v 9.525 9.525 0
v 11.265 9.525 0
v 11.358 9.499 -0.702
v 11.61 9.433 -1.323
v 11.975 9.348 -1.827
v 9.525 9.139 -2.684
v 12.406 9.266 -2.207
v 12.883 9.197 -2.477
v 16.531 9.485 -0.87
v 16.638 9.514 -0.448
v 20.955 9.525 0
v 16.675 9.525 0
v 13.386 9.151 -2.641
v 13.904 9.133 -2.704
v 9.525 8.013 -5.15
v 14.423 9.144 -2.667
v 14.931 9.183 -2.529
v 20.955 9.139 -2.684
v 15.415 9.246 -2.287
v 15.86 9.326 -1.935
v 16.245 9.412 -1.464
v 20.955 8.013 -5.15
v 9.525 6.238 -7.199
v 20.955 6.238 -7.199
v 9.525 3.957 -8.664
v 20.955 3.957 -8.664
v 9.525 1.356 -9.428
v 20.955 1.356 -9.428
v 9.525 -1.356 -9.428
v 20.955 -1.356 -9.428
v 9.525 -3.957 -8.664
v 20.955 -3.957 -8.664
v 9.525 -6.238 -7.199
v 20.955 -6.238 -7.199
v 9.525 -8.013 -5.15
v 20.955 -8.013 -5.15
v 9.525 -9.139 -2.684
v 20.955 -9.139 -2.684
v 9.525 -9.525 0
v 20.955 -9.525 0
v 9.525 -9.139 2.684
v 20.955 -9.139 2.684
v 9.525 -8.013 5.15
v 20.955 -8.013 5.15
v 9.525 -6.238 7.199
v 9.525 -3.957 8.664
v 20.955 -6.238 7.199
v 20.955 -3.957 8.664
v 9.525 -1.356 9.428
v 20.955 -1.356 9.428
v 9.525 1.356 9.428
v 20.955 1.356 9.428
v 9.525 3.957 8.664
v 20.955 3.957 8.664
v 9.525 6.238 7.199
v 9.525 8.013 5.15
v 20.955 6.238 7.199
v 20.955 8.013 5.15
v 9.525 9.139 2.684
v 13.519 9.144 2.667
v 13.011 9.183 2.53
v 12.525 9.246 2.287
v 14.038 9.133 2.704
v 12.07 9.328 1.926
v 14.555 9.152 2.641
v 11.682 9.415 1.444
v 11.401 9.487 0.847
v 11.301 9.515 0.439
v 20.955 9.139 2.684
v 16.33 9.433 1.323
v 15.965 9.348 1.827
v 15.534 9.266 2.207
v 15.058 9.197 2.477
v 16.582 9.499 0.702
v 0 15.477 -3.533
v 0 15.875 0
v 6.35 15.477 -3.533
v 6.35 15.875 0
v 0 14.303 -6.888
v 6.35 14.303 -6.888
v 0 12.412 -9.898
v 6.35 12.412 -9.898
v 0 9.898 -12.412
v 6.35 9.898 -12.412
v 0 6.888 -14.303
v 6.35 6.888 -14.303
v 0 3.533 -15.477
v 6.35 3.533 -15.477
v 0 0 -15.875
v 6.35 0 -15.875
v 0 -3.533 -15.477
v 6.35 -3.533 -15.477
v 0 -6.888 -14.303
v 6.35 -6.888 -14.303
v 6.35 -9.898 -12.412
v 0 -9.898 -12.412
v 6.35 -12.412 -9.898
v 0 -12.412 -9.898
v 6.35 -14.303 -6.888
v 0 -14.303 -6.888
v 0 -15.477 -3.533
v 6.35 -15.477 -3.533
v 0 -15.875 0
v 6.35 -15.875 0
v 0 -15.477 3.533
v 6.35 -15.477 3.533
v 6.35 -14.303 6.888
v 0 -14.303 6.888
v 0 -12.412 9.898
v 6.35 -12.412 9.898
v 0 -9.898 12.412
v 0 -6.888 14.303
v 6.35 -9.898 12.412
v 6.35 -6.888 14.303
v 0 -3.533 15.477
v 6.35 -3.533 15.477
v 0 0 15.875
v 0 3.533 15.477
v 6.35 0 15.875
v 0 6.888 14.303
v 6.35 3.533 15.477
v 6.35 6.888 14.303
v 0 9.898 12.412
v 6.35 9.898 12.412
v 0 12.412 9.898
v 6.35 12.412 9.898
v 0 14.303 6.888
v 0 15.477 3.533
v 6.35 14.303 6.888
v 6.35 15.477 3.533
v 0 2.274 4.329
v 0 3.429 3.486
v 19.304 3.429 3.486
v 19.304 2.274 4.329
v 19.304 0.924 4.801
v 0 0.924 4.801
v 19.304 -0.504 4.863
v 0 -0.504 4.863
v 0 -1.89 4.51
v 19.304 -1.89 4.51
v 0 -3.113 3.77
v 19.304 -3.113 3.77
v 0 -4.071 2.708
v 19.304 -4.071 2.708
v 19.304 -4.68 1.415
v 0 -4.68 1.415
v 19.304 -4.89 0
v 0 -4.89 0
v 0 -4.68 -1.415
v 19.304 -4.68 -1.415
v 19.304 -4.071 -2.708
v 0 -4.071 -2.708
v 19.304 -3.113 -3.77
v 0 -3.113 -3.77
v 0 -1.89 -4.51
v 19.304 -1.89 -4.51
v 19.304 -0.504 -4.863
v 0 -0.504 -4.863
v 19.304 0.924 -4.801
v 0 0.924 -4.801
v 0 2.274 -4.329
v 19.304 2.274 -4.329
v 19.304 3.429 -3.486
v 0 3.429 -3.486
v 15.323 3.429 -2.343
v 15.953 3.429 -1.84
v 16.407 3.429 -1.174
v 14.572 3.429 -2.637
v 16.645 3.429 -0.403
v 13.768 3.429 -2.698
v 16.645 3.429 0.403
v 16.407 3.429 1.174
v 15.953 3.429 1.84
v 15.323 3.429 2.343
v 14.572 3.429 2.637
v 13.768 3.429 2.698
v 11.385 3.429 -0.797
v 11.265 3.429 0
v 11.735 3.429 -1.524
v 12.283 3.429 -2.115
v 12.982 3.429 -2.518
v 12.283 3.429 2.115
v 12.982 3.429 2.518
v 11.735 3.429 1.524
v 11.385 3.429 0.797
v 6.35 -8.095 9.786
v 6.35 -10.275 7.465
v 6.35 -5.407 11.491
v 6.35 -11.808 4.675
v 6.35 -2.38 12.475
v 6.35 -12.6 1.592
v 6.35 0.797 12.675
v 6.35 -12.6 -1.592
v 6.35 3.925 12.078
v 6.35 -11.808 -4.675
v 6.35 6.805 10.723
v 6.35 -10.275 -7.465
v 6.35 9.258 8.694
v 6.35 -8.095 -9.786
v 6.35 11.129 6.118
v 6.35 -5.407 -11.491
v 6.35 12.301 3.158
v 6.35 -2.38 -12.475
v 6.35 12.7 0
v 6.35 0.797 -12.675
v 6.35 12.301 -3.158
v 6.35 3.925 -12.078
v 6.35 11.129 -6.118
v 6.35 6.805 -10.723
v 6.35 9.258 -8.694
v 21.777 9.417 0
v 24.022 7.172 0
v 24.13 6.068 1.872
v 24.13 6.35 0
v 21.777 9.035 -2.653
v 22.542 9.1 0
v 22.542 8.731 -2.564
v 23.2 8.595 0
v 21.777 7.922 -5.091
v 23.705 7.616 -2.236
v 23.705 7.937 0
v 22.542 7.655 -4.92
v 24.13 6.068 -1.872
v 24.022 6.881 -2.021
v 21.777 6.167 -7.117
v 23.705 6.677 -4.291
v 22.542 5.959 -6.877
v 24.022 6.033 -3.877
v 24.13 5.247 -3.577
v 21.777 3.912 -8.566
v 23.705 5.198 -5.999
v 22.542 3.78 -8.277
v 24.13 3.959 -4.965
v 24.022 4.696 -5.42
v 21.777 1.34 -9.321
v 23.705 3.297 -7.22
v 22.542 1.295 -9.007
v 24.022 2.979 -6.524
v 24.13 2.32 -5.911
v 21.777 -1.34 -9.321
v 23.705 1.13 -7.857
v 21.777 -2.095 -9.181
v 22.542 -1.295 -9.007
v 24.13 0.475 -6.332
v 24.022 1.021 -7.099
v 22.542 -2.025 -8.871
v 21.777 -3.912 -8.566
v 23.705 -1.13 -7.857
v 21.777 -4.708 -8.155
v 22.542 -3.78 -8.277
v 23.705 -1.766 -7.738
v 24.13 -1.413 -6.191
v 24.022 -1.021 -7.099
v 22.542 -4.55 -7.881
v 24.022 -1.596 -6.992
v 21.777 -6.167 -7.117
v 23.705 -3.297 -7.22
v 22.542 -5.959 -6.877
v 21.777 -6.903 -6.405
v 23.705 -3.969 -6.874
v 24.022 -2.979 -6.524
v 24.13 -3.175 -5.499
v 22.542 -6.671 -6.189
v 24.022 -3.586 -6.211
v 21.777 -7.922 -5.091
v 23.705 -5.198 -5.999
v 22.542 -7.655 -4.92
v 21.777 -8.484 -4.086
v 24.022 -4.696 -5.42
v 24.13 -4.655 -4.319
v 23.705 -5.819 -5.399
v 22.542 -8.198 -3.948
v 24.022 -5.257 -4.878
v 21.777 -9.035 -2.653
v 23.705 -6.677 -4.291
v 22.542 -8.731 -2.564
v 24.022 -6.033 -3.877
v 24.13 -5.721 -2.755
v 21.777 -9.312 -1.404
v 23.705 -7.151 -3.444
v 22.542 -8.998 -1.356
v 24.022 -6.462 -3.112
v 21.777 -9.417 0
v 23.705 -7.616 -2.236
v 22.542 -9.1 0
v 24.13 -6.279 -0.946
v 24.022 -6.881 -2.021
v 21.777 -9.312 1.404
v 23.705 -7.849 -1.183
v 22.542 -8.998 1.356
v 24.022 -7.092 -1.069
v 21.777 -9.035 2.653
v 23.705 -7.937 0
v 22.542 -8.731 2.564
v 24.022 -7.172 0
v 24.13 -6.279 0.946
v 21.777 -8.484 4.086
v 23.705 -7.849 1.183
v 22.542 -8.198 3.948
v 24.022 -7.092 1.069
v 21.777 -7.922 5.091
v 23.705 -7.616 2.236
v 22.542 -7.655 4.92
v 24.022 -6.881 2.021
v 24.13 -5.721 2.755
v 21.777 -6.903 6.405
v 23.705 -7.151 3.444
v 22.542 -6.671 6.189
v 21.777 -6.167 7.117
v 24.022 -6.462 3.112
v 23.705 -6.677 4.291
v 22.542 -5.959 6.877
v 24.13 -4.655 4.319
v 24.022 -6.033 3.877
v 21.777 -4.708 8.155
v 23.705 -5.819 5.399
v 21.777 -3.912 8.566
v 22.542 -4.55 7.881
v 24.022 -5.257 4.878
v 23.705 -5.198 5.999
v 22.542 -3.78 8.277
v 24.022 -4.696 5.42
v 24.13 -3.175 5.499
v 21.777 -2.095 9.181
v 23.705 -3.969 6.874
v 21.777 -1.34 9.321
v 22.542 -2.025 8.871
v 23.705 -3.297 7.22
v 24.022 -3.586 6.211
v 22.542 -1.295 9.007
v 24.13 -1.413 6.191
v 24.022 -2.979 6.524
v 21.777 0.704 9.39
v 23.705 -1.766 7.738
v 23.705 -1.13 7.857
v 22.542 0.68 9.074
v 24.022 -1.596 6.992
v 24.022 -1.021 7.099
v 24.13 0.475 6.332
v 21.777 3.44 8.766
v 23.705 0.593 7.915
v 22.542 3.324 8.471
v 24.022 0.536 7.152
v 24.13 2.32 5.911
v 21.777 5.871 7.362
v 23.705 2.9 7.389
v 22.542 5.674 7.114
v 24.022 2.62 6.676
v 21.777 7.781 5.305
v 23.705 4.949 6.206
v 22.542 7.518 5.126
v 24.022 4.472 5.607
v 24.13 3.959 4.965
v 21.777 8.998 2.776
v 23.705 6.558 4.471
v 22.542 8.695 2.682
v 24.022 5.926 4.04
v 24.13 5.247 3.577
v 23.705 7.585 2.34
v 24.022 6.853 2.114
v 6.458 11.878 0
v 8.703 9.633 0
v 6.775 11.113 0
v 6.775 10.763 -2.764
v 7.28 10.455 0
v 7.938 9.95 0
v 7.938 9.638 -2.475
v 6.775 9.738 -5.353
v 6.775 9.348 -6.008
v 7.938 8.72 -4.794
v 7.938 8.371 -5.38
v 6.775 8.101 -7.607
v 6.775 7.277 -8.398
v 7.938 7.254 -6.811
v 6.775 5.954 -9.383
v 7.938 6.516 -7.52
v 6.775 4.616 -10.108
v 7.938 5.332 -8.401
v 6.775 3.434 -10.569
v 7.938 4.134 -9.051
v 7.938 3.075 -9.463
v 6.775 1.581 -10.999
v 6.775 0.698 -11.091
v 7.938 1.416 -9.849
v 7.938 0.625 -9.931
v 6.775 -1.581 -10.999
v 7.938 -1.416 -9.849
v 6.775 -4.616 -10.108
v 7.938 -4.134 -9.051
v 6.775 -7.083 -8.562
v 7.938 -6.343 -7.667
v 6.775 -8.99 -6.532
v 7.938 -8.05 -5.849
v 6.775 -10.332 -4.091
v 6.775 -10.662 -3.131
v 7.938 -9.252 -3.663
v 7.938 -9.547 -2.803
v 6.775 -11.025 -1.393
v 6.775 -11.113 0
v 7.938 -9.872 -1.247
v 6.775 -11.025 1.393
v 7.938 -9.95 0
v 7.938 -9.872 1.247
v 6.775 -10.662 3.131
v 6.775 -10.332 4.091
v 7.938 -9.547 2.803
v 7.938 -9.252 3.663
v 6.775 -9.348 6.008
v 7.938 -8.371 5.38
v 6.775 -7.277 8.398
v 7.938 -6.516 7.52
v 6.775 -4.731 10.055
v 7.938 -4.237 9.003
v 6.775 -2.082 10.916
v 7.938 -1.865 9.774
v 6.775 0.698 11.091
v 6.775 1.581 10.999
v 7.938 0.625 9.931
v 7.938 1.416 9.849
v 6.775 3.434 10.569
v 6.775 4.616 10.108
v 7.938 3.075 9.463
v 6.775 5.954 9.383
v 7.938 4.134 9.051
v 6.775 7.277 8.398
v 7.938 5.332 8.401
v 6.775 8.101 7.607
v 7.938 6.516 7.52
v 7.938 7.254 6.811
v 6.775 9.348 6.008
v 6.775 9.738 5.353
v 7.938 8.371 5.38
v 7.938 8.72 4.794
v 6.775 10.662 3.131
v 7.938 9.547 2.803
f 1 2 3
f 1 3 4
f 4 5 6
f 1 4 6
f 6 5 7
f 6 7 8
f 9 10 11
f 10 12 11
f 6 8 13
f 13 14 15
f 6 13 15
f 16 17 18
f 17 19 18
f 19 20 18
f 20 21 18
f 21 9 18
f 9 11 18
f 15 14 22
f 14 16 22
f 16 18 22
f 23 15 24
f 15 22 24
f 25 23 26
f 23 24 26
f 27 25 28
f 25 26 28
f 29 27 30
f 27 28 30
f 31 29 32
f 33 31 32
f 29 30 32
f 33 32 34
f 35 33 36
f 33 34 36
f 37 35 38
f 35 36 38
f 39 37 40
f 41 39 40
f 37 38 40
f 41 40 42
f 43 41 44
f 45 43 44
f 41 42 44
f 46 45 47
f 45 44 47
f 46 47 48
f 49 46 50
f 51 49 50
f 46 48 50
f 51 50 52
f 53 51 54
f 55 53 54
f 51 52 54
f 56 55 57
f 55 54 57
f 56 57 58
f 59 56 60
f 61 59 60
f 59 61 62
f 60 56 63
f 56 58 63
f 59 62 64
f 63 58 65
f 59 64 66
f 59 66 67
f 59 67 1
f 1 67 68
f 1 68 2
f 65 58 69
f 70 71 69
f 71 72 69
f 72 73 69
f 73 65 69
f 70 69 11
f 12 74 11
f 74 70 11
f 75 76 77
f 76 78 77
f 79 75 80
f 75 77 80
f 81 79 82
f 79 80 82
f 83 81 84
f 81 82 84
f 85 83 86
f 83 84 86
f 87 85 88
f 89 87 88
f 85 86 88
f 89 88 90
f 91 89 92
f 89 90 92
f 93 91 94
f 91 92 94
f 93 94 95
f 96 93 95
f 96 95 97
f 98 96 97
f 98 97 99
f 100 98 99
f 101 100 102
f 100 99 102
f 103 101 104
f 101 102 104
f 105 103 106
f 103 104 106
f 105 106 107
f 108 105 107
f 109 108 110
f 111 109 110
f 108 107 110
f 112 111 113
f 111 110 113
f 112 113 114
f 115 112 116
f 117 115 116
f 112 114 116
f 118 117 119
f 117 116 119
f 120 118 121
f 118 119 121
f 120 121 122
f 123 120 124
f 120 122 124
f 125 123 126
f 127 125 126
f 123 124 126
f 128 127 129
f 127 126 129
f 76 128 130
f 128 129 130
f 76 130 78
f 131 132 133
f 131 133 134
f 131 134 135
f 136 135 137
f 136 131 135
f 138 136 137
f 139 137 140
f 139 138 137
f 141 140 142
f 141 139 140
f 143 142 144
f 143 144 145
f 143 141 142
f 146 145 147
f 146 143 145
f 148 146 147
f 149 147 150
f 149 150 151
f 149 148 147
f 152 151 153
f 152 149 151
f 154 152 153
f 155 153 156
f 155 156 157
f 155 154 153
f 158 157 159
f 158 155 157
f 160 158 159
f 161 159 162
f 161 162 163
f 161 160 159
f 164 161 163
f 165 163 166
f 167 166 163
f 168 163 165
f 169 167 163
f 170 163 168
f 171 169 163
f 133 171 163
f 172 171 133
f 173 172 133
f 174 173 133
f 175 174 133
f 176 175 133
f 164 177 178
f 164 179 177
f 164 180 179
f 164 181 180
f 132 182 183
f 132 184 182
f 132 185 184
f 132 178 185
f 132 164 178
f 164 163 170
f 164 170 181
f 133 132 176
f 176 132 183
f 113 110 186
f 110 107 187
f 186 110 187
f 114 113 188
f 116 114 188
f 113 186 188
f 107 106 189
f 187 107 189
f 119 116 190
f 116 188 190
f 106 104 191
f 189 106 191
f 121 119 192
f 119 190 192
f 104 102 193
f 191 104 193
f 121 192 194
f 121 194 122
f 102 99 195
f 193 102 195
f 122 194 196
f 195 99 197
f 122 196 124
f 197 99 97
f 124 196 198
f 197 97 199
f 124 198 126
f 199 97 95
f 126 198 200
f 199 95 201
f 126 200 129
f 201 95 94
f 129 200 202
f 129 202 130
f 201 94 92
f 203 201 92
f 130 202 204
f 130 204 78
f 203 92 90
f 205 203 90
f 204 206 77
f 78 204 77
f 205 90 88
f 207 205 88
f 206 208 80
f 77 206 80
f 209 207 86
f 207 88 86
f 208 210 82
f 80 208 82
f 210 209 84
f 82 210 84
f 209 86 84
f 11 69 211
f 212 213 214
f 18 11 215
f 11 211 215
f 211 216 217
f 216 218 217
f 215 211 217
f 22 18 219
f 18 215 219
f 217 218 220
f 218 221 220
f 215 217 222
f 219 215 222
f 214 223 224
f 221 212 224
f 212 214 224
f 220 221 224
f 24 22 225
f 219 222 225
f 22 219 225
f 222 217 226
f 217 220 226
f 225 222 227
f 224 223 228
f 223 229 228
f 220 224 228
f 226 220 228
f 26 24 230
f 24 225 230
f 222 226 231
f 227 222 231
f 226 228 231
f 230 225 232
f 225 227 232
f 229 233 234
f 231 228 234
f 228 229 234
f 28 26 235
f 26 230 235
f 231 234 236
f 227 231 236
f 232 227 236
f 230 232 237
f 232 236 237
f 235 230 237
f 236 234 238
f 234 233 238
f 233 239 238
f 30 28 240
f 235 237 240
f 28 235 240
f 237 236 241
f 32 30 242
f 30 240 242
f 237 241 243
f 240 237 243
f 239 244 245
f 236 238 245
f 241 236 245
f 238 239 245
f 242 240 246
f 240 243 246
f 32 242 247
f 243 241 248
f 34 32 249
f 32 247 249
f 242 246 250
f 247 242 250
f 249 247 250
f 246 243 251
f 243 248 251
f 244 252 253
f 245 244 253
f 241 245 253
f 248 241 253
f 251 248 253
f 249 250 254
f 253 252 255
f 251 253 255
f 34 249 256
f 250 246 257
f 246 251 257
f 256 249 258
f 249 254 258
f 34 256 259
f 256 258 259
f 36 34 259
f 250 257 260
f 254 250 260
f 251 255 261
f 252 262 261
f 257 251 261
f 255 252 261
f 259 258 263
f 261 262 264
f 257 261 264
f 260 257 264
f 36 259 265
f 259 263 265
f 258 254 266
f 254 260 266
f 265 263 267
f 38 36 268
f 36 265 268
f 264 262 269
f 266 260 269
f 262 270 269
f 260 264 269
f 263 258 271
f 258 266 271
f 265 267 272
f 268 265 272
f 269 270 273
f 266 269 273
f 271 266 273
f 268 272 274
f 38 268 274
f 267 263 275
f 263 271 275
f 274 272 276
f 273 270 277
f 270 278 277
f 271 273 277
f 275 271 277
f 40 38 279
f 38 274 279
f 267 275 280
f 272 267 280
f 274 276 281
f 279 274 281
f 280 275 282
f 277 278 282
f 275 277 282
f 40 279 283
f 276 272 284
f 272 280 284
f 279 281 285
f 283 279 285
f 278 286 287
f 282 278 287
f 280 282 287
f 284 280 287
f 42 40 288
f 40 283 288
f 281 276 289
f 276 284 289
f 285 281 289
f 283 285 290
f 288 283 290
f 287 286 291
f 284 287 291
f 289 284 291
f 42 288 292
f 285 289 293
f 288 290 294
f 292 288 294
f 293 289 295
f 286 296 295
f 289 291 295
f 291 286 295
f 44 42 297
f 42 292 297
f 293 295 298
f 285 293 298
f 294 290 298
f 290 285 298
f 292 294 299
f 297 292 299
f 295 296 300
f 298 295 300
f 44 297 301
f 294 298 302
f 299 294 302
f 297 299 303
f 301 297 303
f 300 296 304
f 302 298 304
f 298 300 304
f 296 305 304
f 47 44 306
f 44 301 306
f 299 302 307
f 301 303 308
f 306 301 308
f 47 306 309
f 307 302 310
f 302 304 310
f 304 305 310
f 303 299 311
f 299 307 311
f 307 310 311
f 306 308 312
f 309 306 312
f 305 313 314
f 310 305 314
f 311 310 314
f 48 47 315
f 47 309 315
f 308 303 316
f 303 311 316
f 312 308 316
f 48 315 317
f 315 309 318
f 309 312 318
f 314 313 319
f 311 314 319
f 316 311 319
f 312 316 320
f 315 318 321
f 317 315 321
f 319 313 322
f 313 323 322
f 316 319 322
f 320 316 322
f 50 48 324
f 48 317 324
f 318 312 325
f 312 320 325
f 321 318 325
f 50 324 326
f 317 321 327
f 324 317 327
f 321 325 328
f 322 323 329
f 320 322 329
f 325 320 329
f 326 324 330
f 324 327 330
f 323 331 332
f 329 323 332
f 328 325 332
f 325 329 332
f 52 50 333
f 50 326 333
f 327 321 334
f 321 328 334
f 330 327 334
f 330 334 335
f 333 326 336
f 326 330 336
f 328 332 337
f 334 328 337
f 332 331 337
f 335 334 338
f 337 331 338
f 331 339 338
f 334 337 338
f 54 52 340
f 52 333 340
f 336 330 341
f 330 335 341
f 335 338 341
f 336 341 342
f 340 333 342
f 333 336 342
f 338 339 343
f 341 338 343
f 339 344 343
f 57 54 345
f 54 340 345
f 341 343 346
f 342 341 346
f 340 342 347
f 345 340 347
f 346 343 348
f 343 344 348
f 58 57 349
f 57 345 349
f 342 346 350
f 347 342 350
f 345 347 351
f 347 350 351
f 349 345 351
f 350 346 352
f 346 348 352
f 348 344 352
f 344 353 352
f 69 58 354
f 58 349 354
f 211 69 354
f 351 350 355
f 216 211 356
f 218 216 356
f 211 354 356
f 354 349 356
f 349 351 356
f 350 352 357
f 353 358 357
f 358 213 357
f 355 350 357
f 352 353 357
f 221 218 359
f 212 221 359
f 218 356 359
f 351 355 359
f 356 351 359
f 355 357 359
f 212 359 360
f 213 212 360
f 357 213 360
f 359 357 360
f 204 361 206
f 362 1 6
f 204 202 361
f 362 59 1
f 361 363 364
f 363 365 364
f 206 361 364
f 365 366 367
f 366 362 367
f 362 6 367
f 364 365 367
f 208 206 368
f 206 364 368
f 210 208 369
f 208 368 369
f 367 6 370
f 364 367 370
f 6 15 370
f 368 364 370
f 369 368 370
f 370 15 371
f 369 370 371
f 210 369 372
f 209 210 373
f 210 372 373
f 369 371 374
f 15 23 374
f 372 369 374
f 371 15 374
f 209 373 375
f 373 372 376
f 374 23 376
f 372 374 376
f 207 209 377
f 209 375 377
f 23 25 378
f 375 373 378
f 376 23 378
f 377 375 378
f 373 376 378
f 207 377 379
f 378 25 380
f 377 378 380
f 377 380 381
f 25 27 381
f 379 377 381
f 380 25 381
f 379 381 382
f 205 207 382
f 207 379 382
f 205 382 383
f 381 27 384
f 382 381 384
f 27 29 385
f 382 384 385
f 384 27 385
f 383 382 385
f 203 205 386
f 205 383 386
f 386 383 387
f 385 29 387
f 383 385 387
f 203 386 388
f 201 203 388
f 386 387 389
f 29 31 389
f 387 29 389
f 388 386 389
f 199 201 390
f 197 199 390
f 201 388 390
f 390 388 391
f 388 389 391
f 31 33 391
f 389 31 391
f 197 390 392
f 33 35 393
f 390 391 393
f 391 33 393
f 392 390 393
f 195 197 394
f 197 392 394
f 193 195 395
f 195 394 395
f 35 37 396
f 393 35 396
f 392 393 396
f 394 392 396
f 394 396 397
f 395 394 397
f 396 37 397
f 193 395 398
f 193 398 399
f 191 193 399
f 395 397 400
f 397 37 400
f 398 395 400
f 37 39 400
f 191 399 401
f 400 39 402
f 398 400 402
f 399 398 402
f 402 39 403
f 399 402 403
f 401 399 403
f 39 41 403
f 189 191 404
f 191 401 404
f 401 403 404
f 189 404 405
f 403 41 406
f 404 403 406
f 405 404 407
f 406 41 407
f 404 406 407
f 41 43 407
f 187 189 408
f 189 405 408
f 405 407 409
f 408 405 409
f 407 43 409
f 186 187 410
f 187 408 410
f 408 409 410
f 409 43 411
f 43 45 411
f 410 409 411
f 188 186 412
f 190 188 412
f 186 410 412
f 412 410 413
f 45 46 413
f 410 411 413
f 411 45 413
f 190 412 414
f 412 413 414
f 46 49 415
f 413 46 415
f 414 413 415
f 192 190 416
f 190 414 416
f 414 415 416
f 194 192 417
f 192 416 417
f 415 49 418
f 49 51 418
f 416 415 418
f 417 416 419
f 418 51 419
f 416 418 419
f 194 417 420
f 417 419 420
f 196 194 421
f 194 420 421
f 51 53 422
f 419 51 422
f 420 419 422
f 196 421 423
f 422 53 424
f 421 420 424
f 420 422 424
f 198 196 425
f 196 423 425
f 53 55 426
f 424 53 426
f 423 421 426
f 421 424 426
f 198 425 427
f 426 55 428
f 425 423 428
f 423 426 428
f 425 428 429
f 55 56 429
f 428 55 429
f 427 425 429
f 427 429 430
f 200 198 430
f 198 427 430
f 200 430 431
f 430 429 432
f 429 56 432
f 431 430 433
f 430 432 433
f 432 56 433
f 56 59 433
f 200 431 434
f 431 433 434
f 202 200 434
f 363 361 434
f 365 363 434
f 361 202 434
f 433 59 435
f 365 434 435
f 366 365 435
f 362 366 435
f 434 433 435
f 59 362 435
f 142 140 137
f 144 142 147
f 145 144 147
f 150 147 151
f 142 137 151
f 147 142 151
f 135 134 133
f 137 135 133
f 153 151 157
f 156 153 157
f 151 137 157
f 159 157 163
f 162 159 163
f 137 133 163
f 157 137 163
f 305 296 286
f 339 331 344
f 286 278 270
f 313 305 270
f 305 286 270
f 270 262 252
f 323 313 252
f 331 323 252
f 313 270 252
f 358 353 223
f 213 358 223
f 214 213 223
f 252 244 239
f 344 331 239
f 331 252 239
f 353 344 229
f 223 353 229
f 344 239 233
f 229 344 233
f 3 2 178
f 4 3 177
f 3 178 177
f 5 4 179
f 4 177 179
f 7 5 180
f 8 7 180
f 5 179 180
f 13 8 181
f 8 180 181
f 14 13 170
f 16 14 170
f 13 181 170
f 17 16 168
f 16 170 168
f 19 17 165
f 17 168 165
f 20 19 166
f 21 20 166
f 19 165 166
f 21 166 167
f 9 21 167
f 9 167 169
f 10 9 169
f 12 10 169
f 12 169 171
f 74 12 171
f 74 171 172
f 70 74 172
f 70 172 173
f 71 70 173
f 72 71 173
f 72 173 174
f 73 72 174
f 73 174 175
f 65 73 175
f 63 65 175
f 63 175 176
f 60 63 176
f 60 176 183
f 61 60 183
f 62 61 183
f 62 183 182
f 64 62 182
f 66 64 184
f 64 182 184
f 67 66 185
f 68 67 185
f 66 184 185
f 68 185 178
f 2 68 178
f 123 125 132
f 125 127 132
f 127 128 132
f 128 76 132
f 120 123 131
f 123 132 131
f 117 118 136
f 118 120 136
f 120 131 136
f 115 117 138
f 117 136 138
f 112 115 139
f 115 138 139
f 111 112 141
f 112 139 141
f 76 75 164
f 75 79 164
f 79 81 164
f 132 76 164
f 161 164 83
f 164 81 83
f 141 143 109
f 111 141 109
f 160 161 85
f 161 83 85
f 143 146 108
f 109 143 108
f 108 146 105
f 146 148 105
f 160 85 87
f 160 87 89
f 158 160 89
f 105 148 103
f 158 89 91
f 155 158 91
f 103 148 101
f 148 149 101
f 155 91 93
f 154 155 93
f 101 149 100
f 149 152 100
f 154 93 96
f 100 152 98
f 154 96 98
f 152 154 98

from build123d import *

# Parameters (mm, degrees)
CUT_EXTRUDE1_DEPTH          = 19.304
F_1_4_28_TAPPED_HOLE1_D     = 5.4102
F_1_4_28_TAPPED_HOLE1_DEPTH = 6.096


with BuildPart() as part:
    # Sketch1 → Revolve1 (revolve)
    with BuildSketch(Plane.XY):
        with BuildLine():
            Line((0, 0), (0, 15.875))
            Line((0, 15.875), (6.35, 15.875))
            Line((6.35, 15.875), (6.35, 12.7))
            ThreePointArc((6.35, 12.7), (7.27993597, 10.45493597), (9.525, 9.525))
            Line((9.525, 9.525), (20.955, 9.525))
            ThreePointArc((20.955, 9.525), (23.20006403, 8.59506403), (24.13, 6.35))
            Line((24.13, 6.35), (24.13, 0))
            Line((24.13, 0), (0, 0))
        make_face()
    revolve(axis=Axis((24.13, 0, 0), (-1, 0, 0)))

    # Sketch2 → Cut-Extrude1 (cut)
    with BuildSketch(Plane.ZY):
        with BuildLine():
            Line((-3.485565844, 3.429), (3.485565844, 3.429))
            ThreePointArc((3.485565844, 3.429), (0, -4.8895), (-3.485565844, 3.429))
        make_face()
    extrude(amount=-CUT_EXTRUDE1_DEPTH, mode=Mode.SUBTRACT)

    # 1/4-28 Tapped Hole1
    with Locations(Plane(origin=(0, 9.525, 0), x_dir=(1, 0, 0), z_dir=(0, 1, 0))):
        with Locations((13.97, 0)):
            Hole(F_1_4_28_TAPPED_HOLE1_D / 2, depth=F_1_4_28_TAPPED_HOLE1_DEPTH)


solid = part.part
